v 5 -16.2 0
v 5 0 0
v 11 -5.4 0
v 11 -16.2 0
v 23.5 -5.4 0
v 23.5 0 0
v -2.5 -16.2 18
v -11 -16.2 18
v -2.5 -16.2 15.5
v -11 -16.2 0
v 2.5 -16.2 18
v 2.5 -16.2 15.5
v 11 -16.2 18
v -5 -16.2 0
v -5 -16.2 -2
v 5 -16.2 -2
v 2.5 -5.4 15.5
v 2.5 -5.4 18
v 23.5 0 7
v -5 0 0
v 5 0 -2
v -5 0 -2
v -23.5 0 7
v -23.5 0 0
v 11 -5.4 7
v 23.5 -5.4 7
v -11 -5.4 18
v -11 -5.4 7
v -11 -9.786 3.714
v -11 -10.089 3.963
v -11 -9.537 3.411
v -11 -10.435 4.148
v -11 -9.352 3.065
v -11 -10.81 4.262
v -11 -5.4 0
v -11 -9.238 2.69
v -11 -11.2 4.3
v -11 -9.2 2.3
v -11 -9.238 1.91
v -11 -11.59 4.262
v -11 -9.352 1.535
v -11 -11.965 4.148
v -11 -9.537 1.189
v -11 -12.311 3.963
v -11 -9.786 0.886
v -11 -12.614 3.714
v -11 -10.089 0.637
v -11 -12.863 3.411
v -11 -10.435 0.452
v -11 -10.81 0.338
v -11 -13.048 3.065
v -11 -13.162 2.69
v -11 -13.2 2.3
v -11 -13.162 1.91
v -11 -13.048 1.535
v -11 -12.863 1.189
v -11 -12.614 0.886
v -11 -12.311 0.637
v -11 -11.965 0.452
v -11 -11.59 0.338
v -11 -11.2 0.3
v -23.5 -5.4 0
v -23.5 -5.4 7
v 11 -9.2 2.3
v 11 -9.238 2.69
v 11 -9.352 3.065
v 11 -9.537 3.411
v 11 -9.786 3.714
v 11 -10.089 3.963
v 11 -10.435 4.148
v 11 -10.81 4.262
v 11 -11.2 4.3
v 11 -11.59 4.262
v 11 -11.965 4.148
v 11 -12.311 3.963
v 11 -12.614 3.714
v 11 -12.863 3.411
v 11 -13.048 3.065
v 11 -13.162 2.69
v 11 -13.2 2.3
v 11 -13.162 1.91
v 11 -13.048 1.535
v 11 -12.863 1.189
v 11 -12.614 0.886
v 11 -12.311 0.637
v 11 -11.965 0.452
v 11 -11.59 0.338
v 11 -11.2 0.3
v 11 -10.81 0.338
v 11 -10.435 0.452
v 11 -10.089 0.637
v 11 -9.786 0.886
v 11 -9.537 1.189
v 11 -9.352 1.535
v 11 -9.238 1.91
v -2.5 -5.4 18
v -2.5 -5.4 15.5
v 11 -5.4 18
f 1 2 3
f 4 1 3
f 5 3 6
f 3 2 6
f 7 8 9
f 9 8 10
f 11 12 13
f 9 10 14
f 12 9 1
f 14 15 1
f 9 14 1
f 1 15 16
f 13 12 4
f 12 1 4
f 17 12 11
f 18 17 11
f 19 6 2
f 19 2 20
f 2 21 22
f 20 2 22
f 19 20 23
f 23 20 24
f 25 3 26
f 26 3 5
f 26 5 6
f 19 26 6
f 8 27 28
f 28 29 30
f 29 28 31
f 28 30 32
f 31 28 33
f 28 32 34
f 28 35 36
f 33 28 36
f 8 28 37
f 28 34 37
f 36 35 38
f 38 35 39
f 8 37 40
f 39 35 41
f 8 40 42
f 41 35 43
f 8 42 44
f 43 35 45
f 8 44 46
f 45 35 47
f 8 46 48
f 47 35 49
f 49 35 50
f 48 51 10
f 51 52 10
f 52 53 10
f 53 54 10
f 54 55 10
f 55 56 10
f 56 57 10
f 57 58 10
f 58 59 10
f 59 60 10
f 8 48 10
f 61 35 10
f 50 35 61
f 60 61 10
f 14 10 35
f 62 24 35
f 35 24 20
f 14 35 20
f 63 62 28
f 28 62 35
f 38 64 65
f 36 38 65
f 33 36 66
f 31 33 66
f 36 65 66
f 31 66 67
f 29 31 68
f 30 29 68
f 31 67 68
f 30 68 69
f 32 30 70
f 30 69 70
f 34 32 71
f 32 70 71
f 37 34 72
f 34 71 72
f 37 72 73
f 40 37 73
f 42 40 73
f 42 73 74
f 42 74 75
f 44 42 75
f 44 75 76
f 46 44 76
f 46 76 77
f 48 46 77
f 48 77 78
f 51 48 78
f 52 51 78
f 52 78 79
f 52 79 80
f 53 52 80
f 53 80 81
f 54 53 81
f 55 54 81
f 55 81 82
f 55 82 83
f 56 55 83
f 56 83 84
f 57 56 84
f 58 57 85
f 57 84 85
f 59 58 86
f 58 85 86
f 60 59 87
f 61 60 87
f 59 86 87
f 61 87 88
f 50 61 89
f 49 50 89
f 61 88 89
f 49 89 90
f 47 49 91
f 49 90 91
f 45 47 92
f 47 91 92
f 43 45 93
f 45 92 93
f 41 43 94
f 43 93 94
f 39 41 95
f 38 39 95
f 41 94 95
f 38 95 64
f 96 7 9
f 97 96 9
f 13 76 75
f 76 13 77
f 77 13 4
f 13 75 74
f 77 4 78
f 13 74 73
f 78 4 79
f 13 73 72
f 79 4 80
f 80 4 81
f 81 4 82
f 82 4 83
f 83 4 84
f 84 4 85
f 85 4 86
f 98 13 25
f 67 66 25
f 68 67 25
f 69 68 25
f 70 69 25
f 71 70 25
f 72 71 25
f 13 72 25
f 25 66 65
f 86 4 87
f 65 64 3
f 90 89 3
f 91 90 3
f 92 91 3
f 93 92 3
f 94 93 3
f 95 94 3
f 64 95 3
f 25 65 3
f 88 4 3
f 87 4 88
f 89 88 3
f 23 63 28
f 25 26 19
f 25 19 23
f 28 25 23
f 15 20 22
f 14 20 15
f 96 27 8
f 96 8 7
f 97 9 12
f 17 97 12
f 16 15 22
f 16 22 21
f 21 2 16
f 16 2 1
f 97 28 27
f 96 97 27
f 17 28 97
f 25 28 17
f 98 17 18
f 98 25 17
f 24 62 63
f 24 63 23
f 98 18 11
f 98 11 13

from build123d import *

# Parameters (mm, degrees)
F0_W     = 12.5
F0_H     = 5.4
F1_DEPTH = 18
F2_R     = 2
F3_DEPTH = 34.501
F4_W     = 5
F4_H     = 16.2
F5_DEPTH = 2
F6_W     = 5.4
F6_H     = 11
F7_DEPTH = 47.001
F9_DEPTH = 16.201


with BuildPart() as f1:
    # F0 (on Top) → F1 (new body)
    with BuildSketch(Plane.XY):
        Polygon((11, 0), (0, 0), (-11, 0), (-11, -5.4), (-11, -16.2), (0, -16.2), (11, -16.2), (11, -5.4), align=None)
        with Locations((17.25, -2.7)):
            Rectangle(F0_W, F0_H)
        with Locations((-17.25, -2.7)):
            Rectangle(F0_W, F0_H)
    extrude(amount=F1_DEPTH)

    # F2 (on face) → F3 (cut, through all)
    with BuildSketch(Plane.YZ.offset(11)):
        with Locations((-11.2, 2.3)):
            Circle(F2_R)
    extrude(amount=-F3_DEPTH, mode=Mode.SUBTRACT)

    # F4 (on face) → F5 (join)
    with BuildSketch(Plane(origin=(0, 0, 0), x_dir=(1, 0, 0), z_dir=(0, 0, -1))):
        with Locations((2.5, 8.1)):
            Rectangle(F4_W, F4_H)
        with Locations((-2.5, 8.1)):
            Rectangle(F4_W, F4_H)
    extrude(amount=F5_DEPTH)

    # F6 (on face) → F7 (cut, through all)
    with BuildSketch(Plane.YZ.offset(23.5)):
        with Locations((-2.7, 12.5)):
            Rectangle(F6_W, F6_H)
    extrude(amount=-F7_DEPTH, mode=Mode.SUBTRACT)

    # F8 (on face) → F9 (cut, through all)
    with BuildSketch(Plane.XZ.offset(16.2)):
        Polygon((2.5, 18), (0, 18), (-2.5, 18), (-2.5, 15.5), (2.5, 15.5), align=None)
    extrude(amount=-F9_DEPTH, mode=Mode.SUBTRACT)


solid = f1.part
